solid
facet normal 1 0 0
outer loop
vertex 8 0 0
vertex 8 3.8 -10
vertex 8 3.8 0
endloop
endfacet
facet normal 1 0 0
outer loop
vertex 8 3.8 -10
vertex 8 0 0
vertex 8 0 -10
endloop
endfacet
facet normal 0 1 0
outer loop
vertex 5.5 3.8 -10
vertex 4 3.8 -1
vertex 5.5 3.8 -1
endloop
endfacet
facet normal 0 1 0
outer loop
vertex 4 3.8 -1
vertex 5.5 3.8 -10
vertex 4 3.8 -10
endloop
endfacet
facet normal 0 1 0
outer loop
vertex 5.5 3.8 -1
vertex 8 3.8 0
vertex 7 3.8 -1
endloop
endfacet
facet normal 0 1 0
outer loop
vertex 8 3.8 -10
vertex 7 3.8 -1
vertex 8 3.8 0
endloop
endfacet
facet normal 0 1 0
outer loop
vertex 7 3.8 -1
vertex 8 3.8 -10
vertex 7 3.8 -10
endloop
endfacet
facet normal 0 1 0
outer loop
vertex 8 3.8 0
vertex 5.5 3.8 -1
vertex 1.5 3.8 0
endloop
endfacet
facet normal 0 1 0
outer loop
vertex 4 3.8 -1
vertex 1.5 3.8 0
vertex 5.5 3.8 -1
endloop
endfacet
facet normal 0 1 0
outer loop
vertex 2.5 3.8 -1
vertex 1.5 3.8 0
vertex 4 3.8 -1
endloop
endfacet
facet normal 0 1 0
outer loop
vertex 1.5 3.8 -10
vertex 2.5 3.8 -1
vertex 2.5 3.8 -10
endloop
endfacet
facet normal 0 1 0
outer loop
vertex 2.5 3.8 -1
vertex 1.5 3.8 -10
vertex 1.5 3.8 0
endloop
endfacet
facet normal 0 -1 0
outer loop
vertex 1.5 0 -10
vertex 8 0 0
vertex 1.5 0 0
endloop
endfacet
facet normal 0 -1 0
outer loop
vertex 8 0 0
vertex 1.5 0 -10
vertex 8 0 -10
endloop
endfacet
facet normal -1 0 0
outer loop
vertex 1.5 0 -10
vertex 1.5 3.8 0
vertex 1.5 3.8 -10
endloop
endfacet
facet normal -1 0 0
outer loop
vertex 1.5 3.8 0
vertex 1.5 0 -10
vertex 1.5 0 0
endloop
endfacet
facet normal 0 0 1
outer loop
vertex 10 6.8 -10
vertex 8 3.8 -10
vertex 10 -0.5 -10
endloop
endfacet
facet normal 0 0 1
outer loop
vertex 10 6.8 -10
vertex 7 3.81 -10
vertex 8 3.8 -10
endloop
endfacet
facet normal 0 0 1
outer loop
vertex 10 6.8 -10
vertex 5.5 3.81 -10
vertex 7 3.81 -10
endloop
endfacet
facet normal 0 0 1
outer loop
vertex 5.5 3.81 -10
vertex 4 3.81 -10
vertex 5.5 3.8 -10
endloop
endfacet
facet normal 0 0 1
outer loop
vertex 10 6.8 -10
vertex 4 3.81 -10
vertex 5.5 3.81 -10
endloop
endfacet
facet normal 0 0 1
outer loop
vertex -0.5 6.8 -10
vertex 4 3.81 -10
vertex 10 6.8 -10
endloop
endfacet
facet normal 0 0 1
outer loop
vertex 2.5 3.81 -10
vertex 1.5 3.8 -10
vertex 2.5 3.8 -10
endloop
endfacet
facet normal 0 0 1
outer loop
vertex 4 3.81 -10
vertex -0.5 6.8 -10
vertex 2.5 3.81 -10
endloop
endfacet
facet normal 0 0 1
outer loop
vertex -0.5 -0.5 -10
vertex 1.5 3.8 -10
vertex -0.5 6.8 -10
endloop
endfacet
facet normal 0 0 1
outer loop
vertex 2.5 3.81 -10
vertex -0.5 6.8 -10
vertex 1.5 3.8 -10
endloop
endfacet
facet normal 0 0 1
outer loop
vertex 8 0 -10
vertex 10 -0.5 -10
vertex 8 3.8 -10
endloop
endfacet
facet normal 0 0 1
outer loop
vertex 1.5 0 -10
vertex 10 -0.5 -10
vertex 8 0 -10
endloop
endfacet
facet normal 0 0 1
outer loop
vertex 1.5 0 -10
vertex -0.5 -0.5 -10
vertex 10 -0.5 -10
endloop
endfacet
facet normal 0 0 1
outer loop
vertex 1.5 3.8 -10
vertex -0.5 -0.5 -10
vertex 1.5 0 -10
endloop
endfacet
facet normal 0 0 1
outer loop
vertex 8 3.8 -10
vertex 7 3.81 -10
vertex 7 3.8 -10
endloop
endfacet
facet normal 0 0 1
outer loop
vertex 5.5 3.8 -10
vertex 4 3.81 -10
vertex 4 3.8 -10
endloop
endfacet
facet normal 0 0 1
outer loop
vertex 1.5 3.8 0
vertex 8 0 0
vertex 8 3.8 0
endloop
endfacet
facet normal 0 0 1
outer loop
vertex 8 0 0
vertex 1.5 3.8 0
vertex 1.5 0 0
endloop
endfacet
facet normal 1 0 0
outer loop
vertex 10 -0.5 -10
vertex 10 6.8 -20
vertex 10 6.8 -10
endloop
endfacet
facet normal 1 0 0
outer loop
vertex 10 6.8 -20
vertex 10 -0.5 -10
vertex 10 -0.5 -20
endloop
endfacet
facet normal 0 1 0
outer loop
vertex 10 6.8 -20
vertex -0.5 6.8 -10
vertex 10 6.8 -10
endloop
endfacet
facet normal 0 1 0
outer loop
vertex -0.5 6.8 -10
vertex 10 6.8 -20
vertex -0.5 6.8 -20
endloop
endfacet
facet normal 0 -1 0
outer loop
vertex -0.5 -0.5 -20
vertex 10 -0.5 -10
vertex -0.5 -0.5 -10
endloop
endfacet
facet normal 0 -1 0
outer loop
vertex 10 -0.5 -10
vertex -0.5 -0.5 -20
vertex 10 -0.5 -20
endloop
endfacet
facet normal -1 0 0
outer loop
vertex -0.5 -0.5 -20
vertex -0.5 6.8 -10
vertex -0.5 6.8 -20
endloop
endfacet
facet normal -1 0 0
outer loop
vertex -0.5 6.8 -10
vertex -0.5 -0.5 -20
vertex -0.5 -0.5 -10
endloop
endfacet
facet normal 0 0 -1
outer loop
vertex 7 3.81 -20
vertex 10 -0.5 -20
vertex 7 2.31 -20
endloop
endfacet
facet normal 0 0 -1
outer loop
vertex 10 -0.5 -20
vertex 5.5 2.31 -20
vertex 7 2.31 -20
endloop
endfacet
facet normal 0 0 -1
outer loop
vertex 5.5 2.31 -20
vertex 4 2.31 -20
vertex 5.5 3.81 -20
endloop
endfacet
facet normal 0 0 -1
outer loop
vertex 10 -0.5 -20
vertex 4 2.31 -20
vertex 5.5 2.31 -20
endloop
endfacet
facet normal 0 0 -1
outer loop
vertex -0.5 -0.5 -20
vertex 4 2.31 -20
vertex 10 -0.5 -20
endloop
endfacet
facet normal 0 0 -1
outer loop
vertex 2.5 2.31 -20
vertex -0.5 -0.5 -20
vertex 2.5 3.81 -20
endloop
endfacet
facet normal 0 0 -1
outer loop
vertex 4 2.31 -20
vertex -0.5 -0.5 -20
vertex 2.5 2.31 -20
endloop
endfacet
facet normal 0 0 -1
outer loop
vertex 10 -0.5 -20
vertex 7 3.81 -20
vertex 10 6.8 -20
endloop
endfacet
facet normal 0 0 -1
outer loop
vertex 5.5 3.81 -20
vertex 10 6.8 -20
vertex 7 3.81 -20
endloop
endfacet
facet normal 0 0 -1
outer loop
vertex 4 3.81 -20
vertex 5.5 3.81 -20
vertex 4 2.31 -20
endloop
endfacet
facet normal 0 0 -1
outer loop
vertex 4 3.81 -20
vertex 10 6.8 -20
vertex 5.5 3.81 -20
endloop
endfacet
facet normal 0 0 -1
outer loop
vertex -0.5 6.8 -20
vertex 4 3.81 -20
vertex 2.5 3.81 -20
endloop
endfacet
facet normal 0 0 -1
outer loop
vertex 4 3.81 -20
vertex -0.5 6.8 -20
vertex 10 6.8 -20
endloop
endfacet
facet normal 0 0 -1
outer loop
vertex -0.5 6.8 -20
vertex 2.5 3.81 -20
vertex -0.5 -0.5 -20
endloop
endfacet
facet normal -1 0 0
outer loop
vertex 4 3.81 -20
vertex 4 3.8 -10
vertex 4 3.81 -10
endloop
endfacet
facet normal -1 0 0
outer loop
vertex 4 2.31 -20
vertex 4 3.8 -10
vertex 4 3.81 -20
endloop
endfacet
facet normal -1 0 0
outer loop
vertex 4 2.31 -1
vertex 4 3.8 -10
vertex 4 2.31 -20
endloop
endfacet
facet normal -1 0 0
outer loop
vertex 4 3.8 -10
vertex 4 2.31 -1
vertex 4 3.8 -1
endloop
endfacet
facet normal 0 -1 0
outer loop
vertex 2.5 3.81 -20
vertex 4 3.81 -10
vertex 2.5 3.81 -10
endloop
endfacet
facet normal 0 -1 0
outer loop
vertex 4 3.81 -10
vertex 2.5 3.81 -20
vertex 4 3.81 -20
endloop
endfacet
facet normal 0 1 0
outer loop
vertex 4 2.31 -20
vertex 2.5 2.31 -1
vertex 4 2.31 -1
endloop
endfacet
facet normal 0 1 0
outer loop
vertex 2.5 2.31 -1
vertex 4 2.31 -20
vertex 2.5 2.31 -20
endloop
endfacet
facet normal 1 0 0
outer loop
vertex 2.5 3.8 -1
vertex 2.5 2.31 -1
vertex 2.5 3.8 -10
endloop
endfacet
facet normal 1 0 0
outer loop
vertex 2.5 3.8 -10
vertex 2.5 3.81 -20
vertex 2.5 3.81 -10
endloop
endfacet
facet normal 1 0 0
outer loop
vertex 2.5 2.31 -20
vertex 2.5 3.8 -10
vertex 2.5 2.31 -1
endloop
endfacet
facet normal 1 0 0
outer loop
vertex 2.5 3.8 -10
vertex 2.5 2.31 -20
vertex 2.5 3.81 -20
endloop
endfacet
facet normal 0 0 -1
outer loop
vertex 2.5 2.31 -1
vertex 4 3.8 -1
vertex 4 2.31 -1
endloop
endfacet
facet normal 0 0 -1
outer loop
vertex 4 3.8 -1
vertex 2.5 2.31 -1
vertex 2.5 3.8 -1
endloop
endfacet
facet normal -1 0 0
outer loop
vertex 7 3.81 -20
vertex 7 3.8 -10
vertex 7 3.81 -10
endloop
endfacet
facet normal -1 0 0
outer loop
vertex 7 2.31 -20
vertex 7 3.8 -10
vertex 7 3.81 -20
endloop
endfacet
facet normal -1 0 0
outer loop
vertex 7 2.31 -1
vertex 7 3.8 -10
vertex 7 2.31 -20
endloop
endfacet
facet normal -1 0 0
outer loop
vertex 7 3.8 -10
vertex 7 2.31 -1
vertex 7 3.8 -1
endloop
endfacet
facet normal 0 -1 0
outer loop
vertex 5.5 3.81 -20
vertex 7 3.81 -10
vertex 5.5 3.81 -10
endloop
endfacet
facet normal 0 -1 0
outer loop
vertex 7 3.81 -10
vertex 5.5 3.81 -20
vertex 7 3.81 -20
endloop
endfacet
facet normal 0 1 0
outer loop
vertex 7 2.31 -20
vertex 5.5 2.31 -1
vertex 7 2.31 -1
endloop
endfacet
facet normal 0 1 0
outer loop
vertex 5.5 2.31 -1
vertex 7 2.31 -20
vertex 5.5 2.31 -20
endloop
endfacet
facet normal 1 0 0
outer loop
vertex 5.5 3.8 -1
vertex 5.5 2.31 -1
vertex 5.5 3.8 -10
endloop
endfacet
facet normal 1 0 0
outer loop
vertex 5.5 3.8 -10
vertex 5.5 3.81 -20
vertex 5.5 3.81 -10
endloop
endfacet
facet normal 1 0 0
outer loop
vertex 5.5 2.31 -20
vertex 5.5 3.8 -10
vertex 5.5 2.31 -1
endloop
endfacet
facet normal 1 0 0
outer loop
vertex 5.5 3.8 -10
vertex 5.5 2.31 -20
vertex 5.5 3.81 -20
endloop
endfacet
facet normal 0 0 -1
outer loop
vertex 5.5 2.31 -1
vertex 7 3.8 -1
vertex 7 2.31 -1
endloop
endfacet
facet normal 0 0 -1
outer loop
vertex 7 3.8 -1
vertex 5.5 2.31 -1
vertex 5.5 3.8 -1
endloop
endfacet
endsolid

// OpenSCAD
// thickness of the outer wall
wall_thickness=1.5;
// size of male connector
male_x=7;
male_y=10;
male_z=4.3;
// size of female housing
female_y=20;
// extra height above male connector for electronics
female_z_extra=2;
male_z_extra=1;
// the amount of offset to make differences work right
diff_offset=.01;

// contact channel width
contact_channel_x=1.5;
contact_channel_y=40;
contact_channel_z=1.5;
// how much of a lip to give the contact channel
contact_channel_recess=1;
contact_channel_separation=3;

// How much extra to add to account for extrusion inaccuracies
extrusion_offset=0.25;

module female(){
	difference(){
		cube([male_x+wall_thickness*2+extrusion_offset*2,
				female_y,
				male_z+wall_thickness*2 + female_z_extra+extrusion_offset*2]);
		translate([wall_thickness,-diff_offset,wall_thickness]){
			cube([male_x + extrusion_offset*2,male_y+diff_offset,male_z + extrusion_offset*2]);
		}
	contact_channel(male_x +extrusion_offset*2,male_y,male_z+ extrusion_offset*2);
	}
}

module contact_channel(x,y,z){
		// one contact left
		translate([(wall_thickness + x/2)-contact_channel_separation/2-contact_channel_x/2,contact_channel_recess,z+wall_thickness]){
			cube([contact_channel_x,contact_channel_y,contact_channel_z]);
		}
		// right contact
		translate([(wall_thickness + x/2)+contact_channel_separation/2-contact_channel_x/2,contact_channel_recess,z+wall_thickness]){
			cube([contact_channel_x,contact_channel_y,contact_channel_z]);
		}
}

module male(){
	difference(){
		union(){
			translate([wall_thickness,0,0]){
				cube([male_x - extrusion_offset*2, male_y, male_z - extrusion_offset*2]);
			}
			translate([-extrusion_offset*2,male_y,-extrusion_offset*2]){
				cube([male_x+wall_thickness*2 + extrusion_offset*2, male_y, male_z+wall_thickness+male_z_extra+extrusion_offset*2]);
			}
		}
	contact_channel(male_x-extrusion_offset*2,male_y,male_z-contact_channel_z-wall_thickness+diff_offset-extrusion_offset*2);
	}
}

rotate([-90,0,0]){
	male();
}
